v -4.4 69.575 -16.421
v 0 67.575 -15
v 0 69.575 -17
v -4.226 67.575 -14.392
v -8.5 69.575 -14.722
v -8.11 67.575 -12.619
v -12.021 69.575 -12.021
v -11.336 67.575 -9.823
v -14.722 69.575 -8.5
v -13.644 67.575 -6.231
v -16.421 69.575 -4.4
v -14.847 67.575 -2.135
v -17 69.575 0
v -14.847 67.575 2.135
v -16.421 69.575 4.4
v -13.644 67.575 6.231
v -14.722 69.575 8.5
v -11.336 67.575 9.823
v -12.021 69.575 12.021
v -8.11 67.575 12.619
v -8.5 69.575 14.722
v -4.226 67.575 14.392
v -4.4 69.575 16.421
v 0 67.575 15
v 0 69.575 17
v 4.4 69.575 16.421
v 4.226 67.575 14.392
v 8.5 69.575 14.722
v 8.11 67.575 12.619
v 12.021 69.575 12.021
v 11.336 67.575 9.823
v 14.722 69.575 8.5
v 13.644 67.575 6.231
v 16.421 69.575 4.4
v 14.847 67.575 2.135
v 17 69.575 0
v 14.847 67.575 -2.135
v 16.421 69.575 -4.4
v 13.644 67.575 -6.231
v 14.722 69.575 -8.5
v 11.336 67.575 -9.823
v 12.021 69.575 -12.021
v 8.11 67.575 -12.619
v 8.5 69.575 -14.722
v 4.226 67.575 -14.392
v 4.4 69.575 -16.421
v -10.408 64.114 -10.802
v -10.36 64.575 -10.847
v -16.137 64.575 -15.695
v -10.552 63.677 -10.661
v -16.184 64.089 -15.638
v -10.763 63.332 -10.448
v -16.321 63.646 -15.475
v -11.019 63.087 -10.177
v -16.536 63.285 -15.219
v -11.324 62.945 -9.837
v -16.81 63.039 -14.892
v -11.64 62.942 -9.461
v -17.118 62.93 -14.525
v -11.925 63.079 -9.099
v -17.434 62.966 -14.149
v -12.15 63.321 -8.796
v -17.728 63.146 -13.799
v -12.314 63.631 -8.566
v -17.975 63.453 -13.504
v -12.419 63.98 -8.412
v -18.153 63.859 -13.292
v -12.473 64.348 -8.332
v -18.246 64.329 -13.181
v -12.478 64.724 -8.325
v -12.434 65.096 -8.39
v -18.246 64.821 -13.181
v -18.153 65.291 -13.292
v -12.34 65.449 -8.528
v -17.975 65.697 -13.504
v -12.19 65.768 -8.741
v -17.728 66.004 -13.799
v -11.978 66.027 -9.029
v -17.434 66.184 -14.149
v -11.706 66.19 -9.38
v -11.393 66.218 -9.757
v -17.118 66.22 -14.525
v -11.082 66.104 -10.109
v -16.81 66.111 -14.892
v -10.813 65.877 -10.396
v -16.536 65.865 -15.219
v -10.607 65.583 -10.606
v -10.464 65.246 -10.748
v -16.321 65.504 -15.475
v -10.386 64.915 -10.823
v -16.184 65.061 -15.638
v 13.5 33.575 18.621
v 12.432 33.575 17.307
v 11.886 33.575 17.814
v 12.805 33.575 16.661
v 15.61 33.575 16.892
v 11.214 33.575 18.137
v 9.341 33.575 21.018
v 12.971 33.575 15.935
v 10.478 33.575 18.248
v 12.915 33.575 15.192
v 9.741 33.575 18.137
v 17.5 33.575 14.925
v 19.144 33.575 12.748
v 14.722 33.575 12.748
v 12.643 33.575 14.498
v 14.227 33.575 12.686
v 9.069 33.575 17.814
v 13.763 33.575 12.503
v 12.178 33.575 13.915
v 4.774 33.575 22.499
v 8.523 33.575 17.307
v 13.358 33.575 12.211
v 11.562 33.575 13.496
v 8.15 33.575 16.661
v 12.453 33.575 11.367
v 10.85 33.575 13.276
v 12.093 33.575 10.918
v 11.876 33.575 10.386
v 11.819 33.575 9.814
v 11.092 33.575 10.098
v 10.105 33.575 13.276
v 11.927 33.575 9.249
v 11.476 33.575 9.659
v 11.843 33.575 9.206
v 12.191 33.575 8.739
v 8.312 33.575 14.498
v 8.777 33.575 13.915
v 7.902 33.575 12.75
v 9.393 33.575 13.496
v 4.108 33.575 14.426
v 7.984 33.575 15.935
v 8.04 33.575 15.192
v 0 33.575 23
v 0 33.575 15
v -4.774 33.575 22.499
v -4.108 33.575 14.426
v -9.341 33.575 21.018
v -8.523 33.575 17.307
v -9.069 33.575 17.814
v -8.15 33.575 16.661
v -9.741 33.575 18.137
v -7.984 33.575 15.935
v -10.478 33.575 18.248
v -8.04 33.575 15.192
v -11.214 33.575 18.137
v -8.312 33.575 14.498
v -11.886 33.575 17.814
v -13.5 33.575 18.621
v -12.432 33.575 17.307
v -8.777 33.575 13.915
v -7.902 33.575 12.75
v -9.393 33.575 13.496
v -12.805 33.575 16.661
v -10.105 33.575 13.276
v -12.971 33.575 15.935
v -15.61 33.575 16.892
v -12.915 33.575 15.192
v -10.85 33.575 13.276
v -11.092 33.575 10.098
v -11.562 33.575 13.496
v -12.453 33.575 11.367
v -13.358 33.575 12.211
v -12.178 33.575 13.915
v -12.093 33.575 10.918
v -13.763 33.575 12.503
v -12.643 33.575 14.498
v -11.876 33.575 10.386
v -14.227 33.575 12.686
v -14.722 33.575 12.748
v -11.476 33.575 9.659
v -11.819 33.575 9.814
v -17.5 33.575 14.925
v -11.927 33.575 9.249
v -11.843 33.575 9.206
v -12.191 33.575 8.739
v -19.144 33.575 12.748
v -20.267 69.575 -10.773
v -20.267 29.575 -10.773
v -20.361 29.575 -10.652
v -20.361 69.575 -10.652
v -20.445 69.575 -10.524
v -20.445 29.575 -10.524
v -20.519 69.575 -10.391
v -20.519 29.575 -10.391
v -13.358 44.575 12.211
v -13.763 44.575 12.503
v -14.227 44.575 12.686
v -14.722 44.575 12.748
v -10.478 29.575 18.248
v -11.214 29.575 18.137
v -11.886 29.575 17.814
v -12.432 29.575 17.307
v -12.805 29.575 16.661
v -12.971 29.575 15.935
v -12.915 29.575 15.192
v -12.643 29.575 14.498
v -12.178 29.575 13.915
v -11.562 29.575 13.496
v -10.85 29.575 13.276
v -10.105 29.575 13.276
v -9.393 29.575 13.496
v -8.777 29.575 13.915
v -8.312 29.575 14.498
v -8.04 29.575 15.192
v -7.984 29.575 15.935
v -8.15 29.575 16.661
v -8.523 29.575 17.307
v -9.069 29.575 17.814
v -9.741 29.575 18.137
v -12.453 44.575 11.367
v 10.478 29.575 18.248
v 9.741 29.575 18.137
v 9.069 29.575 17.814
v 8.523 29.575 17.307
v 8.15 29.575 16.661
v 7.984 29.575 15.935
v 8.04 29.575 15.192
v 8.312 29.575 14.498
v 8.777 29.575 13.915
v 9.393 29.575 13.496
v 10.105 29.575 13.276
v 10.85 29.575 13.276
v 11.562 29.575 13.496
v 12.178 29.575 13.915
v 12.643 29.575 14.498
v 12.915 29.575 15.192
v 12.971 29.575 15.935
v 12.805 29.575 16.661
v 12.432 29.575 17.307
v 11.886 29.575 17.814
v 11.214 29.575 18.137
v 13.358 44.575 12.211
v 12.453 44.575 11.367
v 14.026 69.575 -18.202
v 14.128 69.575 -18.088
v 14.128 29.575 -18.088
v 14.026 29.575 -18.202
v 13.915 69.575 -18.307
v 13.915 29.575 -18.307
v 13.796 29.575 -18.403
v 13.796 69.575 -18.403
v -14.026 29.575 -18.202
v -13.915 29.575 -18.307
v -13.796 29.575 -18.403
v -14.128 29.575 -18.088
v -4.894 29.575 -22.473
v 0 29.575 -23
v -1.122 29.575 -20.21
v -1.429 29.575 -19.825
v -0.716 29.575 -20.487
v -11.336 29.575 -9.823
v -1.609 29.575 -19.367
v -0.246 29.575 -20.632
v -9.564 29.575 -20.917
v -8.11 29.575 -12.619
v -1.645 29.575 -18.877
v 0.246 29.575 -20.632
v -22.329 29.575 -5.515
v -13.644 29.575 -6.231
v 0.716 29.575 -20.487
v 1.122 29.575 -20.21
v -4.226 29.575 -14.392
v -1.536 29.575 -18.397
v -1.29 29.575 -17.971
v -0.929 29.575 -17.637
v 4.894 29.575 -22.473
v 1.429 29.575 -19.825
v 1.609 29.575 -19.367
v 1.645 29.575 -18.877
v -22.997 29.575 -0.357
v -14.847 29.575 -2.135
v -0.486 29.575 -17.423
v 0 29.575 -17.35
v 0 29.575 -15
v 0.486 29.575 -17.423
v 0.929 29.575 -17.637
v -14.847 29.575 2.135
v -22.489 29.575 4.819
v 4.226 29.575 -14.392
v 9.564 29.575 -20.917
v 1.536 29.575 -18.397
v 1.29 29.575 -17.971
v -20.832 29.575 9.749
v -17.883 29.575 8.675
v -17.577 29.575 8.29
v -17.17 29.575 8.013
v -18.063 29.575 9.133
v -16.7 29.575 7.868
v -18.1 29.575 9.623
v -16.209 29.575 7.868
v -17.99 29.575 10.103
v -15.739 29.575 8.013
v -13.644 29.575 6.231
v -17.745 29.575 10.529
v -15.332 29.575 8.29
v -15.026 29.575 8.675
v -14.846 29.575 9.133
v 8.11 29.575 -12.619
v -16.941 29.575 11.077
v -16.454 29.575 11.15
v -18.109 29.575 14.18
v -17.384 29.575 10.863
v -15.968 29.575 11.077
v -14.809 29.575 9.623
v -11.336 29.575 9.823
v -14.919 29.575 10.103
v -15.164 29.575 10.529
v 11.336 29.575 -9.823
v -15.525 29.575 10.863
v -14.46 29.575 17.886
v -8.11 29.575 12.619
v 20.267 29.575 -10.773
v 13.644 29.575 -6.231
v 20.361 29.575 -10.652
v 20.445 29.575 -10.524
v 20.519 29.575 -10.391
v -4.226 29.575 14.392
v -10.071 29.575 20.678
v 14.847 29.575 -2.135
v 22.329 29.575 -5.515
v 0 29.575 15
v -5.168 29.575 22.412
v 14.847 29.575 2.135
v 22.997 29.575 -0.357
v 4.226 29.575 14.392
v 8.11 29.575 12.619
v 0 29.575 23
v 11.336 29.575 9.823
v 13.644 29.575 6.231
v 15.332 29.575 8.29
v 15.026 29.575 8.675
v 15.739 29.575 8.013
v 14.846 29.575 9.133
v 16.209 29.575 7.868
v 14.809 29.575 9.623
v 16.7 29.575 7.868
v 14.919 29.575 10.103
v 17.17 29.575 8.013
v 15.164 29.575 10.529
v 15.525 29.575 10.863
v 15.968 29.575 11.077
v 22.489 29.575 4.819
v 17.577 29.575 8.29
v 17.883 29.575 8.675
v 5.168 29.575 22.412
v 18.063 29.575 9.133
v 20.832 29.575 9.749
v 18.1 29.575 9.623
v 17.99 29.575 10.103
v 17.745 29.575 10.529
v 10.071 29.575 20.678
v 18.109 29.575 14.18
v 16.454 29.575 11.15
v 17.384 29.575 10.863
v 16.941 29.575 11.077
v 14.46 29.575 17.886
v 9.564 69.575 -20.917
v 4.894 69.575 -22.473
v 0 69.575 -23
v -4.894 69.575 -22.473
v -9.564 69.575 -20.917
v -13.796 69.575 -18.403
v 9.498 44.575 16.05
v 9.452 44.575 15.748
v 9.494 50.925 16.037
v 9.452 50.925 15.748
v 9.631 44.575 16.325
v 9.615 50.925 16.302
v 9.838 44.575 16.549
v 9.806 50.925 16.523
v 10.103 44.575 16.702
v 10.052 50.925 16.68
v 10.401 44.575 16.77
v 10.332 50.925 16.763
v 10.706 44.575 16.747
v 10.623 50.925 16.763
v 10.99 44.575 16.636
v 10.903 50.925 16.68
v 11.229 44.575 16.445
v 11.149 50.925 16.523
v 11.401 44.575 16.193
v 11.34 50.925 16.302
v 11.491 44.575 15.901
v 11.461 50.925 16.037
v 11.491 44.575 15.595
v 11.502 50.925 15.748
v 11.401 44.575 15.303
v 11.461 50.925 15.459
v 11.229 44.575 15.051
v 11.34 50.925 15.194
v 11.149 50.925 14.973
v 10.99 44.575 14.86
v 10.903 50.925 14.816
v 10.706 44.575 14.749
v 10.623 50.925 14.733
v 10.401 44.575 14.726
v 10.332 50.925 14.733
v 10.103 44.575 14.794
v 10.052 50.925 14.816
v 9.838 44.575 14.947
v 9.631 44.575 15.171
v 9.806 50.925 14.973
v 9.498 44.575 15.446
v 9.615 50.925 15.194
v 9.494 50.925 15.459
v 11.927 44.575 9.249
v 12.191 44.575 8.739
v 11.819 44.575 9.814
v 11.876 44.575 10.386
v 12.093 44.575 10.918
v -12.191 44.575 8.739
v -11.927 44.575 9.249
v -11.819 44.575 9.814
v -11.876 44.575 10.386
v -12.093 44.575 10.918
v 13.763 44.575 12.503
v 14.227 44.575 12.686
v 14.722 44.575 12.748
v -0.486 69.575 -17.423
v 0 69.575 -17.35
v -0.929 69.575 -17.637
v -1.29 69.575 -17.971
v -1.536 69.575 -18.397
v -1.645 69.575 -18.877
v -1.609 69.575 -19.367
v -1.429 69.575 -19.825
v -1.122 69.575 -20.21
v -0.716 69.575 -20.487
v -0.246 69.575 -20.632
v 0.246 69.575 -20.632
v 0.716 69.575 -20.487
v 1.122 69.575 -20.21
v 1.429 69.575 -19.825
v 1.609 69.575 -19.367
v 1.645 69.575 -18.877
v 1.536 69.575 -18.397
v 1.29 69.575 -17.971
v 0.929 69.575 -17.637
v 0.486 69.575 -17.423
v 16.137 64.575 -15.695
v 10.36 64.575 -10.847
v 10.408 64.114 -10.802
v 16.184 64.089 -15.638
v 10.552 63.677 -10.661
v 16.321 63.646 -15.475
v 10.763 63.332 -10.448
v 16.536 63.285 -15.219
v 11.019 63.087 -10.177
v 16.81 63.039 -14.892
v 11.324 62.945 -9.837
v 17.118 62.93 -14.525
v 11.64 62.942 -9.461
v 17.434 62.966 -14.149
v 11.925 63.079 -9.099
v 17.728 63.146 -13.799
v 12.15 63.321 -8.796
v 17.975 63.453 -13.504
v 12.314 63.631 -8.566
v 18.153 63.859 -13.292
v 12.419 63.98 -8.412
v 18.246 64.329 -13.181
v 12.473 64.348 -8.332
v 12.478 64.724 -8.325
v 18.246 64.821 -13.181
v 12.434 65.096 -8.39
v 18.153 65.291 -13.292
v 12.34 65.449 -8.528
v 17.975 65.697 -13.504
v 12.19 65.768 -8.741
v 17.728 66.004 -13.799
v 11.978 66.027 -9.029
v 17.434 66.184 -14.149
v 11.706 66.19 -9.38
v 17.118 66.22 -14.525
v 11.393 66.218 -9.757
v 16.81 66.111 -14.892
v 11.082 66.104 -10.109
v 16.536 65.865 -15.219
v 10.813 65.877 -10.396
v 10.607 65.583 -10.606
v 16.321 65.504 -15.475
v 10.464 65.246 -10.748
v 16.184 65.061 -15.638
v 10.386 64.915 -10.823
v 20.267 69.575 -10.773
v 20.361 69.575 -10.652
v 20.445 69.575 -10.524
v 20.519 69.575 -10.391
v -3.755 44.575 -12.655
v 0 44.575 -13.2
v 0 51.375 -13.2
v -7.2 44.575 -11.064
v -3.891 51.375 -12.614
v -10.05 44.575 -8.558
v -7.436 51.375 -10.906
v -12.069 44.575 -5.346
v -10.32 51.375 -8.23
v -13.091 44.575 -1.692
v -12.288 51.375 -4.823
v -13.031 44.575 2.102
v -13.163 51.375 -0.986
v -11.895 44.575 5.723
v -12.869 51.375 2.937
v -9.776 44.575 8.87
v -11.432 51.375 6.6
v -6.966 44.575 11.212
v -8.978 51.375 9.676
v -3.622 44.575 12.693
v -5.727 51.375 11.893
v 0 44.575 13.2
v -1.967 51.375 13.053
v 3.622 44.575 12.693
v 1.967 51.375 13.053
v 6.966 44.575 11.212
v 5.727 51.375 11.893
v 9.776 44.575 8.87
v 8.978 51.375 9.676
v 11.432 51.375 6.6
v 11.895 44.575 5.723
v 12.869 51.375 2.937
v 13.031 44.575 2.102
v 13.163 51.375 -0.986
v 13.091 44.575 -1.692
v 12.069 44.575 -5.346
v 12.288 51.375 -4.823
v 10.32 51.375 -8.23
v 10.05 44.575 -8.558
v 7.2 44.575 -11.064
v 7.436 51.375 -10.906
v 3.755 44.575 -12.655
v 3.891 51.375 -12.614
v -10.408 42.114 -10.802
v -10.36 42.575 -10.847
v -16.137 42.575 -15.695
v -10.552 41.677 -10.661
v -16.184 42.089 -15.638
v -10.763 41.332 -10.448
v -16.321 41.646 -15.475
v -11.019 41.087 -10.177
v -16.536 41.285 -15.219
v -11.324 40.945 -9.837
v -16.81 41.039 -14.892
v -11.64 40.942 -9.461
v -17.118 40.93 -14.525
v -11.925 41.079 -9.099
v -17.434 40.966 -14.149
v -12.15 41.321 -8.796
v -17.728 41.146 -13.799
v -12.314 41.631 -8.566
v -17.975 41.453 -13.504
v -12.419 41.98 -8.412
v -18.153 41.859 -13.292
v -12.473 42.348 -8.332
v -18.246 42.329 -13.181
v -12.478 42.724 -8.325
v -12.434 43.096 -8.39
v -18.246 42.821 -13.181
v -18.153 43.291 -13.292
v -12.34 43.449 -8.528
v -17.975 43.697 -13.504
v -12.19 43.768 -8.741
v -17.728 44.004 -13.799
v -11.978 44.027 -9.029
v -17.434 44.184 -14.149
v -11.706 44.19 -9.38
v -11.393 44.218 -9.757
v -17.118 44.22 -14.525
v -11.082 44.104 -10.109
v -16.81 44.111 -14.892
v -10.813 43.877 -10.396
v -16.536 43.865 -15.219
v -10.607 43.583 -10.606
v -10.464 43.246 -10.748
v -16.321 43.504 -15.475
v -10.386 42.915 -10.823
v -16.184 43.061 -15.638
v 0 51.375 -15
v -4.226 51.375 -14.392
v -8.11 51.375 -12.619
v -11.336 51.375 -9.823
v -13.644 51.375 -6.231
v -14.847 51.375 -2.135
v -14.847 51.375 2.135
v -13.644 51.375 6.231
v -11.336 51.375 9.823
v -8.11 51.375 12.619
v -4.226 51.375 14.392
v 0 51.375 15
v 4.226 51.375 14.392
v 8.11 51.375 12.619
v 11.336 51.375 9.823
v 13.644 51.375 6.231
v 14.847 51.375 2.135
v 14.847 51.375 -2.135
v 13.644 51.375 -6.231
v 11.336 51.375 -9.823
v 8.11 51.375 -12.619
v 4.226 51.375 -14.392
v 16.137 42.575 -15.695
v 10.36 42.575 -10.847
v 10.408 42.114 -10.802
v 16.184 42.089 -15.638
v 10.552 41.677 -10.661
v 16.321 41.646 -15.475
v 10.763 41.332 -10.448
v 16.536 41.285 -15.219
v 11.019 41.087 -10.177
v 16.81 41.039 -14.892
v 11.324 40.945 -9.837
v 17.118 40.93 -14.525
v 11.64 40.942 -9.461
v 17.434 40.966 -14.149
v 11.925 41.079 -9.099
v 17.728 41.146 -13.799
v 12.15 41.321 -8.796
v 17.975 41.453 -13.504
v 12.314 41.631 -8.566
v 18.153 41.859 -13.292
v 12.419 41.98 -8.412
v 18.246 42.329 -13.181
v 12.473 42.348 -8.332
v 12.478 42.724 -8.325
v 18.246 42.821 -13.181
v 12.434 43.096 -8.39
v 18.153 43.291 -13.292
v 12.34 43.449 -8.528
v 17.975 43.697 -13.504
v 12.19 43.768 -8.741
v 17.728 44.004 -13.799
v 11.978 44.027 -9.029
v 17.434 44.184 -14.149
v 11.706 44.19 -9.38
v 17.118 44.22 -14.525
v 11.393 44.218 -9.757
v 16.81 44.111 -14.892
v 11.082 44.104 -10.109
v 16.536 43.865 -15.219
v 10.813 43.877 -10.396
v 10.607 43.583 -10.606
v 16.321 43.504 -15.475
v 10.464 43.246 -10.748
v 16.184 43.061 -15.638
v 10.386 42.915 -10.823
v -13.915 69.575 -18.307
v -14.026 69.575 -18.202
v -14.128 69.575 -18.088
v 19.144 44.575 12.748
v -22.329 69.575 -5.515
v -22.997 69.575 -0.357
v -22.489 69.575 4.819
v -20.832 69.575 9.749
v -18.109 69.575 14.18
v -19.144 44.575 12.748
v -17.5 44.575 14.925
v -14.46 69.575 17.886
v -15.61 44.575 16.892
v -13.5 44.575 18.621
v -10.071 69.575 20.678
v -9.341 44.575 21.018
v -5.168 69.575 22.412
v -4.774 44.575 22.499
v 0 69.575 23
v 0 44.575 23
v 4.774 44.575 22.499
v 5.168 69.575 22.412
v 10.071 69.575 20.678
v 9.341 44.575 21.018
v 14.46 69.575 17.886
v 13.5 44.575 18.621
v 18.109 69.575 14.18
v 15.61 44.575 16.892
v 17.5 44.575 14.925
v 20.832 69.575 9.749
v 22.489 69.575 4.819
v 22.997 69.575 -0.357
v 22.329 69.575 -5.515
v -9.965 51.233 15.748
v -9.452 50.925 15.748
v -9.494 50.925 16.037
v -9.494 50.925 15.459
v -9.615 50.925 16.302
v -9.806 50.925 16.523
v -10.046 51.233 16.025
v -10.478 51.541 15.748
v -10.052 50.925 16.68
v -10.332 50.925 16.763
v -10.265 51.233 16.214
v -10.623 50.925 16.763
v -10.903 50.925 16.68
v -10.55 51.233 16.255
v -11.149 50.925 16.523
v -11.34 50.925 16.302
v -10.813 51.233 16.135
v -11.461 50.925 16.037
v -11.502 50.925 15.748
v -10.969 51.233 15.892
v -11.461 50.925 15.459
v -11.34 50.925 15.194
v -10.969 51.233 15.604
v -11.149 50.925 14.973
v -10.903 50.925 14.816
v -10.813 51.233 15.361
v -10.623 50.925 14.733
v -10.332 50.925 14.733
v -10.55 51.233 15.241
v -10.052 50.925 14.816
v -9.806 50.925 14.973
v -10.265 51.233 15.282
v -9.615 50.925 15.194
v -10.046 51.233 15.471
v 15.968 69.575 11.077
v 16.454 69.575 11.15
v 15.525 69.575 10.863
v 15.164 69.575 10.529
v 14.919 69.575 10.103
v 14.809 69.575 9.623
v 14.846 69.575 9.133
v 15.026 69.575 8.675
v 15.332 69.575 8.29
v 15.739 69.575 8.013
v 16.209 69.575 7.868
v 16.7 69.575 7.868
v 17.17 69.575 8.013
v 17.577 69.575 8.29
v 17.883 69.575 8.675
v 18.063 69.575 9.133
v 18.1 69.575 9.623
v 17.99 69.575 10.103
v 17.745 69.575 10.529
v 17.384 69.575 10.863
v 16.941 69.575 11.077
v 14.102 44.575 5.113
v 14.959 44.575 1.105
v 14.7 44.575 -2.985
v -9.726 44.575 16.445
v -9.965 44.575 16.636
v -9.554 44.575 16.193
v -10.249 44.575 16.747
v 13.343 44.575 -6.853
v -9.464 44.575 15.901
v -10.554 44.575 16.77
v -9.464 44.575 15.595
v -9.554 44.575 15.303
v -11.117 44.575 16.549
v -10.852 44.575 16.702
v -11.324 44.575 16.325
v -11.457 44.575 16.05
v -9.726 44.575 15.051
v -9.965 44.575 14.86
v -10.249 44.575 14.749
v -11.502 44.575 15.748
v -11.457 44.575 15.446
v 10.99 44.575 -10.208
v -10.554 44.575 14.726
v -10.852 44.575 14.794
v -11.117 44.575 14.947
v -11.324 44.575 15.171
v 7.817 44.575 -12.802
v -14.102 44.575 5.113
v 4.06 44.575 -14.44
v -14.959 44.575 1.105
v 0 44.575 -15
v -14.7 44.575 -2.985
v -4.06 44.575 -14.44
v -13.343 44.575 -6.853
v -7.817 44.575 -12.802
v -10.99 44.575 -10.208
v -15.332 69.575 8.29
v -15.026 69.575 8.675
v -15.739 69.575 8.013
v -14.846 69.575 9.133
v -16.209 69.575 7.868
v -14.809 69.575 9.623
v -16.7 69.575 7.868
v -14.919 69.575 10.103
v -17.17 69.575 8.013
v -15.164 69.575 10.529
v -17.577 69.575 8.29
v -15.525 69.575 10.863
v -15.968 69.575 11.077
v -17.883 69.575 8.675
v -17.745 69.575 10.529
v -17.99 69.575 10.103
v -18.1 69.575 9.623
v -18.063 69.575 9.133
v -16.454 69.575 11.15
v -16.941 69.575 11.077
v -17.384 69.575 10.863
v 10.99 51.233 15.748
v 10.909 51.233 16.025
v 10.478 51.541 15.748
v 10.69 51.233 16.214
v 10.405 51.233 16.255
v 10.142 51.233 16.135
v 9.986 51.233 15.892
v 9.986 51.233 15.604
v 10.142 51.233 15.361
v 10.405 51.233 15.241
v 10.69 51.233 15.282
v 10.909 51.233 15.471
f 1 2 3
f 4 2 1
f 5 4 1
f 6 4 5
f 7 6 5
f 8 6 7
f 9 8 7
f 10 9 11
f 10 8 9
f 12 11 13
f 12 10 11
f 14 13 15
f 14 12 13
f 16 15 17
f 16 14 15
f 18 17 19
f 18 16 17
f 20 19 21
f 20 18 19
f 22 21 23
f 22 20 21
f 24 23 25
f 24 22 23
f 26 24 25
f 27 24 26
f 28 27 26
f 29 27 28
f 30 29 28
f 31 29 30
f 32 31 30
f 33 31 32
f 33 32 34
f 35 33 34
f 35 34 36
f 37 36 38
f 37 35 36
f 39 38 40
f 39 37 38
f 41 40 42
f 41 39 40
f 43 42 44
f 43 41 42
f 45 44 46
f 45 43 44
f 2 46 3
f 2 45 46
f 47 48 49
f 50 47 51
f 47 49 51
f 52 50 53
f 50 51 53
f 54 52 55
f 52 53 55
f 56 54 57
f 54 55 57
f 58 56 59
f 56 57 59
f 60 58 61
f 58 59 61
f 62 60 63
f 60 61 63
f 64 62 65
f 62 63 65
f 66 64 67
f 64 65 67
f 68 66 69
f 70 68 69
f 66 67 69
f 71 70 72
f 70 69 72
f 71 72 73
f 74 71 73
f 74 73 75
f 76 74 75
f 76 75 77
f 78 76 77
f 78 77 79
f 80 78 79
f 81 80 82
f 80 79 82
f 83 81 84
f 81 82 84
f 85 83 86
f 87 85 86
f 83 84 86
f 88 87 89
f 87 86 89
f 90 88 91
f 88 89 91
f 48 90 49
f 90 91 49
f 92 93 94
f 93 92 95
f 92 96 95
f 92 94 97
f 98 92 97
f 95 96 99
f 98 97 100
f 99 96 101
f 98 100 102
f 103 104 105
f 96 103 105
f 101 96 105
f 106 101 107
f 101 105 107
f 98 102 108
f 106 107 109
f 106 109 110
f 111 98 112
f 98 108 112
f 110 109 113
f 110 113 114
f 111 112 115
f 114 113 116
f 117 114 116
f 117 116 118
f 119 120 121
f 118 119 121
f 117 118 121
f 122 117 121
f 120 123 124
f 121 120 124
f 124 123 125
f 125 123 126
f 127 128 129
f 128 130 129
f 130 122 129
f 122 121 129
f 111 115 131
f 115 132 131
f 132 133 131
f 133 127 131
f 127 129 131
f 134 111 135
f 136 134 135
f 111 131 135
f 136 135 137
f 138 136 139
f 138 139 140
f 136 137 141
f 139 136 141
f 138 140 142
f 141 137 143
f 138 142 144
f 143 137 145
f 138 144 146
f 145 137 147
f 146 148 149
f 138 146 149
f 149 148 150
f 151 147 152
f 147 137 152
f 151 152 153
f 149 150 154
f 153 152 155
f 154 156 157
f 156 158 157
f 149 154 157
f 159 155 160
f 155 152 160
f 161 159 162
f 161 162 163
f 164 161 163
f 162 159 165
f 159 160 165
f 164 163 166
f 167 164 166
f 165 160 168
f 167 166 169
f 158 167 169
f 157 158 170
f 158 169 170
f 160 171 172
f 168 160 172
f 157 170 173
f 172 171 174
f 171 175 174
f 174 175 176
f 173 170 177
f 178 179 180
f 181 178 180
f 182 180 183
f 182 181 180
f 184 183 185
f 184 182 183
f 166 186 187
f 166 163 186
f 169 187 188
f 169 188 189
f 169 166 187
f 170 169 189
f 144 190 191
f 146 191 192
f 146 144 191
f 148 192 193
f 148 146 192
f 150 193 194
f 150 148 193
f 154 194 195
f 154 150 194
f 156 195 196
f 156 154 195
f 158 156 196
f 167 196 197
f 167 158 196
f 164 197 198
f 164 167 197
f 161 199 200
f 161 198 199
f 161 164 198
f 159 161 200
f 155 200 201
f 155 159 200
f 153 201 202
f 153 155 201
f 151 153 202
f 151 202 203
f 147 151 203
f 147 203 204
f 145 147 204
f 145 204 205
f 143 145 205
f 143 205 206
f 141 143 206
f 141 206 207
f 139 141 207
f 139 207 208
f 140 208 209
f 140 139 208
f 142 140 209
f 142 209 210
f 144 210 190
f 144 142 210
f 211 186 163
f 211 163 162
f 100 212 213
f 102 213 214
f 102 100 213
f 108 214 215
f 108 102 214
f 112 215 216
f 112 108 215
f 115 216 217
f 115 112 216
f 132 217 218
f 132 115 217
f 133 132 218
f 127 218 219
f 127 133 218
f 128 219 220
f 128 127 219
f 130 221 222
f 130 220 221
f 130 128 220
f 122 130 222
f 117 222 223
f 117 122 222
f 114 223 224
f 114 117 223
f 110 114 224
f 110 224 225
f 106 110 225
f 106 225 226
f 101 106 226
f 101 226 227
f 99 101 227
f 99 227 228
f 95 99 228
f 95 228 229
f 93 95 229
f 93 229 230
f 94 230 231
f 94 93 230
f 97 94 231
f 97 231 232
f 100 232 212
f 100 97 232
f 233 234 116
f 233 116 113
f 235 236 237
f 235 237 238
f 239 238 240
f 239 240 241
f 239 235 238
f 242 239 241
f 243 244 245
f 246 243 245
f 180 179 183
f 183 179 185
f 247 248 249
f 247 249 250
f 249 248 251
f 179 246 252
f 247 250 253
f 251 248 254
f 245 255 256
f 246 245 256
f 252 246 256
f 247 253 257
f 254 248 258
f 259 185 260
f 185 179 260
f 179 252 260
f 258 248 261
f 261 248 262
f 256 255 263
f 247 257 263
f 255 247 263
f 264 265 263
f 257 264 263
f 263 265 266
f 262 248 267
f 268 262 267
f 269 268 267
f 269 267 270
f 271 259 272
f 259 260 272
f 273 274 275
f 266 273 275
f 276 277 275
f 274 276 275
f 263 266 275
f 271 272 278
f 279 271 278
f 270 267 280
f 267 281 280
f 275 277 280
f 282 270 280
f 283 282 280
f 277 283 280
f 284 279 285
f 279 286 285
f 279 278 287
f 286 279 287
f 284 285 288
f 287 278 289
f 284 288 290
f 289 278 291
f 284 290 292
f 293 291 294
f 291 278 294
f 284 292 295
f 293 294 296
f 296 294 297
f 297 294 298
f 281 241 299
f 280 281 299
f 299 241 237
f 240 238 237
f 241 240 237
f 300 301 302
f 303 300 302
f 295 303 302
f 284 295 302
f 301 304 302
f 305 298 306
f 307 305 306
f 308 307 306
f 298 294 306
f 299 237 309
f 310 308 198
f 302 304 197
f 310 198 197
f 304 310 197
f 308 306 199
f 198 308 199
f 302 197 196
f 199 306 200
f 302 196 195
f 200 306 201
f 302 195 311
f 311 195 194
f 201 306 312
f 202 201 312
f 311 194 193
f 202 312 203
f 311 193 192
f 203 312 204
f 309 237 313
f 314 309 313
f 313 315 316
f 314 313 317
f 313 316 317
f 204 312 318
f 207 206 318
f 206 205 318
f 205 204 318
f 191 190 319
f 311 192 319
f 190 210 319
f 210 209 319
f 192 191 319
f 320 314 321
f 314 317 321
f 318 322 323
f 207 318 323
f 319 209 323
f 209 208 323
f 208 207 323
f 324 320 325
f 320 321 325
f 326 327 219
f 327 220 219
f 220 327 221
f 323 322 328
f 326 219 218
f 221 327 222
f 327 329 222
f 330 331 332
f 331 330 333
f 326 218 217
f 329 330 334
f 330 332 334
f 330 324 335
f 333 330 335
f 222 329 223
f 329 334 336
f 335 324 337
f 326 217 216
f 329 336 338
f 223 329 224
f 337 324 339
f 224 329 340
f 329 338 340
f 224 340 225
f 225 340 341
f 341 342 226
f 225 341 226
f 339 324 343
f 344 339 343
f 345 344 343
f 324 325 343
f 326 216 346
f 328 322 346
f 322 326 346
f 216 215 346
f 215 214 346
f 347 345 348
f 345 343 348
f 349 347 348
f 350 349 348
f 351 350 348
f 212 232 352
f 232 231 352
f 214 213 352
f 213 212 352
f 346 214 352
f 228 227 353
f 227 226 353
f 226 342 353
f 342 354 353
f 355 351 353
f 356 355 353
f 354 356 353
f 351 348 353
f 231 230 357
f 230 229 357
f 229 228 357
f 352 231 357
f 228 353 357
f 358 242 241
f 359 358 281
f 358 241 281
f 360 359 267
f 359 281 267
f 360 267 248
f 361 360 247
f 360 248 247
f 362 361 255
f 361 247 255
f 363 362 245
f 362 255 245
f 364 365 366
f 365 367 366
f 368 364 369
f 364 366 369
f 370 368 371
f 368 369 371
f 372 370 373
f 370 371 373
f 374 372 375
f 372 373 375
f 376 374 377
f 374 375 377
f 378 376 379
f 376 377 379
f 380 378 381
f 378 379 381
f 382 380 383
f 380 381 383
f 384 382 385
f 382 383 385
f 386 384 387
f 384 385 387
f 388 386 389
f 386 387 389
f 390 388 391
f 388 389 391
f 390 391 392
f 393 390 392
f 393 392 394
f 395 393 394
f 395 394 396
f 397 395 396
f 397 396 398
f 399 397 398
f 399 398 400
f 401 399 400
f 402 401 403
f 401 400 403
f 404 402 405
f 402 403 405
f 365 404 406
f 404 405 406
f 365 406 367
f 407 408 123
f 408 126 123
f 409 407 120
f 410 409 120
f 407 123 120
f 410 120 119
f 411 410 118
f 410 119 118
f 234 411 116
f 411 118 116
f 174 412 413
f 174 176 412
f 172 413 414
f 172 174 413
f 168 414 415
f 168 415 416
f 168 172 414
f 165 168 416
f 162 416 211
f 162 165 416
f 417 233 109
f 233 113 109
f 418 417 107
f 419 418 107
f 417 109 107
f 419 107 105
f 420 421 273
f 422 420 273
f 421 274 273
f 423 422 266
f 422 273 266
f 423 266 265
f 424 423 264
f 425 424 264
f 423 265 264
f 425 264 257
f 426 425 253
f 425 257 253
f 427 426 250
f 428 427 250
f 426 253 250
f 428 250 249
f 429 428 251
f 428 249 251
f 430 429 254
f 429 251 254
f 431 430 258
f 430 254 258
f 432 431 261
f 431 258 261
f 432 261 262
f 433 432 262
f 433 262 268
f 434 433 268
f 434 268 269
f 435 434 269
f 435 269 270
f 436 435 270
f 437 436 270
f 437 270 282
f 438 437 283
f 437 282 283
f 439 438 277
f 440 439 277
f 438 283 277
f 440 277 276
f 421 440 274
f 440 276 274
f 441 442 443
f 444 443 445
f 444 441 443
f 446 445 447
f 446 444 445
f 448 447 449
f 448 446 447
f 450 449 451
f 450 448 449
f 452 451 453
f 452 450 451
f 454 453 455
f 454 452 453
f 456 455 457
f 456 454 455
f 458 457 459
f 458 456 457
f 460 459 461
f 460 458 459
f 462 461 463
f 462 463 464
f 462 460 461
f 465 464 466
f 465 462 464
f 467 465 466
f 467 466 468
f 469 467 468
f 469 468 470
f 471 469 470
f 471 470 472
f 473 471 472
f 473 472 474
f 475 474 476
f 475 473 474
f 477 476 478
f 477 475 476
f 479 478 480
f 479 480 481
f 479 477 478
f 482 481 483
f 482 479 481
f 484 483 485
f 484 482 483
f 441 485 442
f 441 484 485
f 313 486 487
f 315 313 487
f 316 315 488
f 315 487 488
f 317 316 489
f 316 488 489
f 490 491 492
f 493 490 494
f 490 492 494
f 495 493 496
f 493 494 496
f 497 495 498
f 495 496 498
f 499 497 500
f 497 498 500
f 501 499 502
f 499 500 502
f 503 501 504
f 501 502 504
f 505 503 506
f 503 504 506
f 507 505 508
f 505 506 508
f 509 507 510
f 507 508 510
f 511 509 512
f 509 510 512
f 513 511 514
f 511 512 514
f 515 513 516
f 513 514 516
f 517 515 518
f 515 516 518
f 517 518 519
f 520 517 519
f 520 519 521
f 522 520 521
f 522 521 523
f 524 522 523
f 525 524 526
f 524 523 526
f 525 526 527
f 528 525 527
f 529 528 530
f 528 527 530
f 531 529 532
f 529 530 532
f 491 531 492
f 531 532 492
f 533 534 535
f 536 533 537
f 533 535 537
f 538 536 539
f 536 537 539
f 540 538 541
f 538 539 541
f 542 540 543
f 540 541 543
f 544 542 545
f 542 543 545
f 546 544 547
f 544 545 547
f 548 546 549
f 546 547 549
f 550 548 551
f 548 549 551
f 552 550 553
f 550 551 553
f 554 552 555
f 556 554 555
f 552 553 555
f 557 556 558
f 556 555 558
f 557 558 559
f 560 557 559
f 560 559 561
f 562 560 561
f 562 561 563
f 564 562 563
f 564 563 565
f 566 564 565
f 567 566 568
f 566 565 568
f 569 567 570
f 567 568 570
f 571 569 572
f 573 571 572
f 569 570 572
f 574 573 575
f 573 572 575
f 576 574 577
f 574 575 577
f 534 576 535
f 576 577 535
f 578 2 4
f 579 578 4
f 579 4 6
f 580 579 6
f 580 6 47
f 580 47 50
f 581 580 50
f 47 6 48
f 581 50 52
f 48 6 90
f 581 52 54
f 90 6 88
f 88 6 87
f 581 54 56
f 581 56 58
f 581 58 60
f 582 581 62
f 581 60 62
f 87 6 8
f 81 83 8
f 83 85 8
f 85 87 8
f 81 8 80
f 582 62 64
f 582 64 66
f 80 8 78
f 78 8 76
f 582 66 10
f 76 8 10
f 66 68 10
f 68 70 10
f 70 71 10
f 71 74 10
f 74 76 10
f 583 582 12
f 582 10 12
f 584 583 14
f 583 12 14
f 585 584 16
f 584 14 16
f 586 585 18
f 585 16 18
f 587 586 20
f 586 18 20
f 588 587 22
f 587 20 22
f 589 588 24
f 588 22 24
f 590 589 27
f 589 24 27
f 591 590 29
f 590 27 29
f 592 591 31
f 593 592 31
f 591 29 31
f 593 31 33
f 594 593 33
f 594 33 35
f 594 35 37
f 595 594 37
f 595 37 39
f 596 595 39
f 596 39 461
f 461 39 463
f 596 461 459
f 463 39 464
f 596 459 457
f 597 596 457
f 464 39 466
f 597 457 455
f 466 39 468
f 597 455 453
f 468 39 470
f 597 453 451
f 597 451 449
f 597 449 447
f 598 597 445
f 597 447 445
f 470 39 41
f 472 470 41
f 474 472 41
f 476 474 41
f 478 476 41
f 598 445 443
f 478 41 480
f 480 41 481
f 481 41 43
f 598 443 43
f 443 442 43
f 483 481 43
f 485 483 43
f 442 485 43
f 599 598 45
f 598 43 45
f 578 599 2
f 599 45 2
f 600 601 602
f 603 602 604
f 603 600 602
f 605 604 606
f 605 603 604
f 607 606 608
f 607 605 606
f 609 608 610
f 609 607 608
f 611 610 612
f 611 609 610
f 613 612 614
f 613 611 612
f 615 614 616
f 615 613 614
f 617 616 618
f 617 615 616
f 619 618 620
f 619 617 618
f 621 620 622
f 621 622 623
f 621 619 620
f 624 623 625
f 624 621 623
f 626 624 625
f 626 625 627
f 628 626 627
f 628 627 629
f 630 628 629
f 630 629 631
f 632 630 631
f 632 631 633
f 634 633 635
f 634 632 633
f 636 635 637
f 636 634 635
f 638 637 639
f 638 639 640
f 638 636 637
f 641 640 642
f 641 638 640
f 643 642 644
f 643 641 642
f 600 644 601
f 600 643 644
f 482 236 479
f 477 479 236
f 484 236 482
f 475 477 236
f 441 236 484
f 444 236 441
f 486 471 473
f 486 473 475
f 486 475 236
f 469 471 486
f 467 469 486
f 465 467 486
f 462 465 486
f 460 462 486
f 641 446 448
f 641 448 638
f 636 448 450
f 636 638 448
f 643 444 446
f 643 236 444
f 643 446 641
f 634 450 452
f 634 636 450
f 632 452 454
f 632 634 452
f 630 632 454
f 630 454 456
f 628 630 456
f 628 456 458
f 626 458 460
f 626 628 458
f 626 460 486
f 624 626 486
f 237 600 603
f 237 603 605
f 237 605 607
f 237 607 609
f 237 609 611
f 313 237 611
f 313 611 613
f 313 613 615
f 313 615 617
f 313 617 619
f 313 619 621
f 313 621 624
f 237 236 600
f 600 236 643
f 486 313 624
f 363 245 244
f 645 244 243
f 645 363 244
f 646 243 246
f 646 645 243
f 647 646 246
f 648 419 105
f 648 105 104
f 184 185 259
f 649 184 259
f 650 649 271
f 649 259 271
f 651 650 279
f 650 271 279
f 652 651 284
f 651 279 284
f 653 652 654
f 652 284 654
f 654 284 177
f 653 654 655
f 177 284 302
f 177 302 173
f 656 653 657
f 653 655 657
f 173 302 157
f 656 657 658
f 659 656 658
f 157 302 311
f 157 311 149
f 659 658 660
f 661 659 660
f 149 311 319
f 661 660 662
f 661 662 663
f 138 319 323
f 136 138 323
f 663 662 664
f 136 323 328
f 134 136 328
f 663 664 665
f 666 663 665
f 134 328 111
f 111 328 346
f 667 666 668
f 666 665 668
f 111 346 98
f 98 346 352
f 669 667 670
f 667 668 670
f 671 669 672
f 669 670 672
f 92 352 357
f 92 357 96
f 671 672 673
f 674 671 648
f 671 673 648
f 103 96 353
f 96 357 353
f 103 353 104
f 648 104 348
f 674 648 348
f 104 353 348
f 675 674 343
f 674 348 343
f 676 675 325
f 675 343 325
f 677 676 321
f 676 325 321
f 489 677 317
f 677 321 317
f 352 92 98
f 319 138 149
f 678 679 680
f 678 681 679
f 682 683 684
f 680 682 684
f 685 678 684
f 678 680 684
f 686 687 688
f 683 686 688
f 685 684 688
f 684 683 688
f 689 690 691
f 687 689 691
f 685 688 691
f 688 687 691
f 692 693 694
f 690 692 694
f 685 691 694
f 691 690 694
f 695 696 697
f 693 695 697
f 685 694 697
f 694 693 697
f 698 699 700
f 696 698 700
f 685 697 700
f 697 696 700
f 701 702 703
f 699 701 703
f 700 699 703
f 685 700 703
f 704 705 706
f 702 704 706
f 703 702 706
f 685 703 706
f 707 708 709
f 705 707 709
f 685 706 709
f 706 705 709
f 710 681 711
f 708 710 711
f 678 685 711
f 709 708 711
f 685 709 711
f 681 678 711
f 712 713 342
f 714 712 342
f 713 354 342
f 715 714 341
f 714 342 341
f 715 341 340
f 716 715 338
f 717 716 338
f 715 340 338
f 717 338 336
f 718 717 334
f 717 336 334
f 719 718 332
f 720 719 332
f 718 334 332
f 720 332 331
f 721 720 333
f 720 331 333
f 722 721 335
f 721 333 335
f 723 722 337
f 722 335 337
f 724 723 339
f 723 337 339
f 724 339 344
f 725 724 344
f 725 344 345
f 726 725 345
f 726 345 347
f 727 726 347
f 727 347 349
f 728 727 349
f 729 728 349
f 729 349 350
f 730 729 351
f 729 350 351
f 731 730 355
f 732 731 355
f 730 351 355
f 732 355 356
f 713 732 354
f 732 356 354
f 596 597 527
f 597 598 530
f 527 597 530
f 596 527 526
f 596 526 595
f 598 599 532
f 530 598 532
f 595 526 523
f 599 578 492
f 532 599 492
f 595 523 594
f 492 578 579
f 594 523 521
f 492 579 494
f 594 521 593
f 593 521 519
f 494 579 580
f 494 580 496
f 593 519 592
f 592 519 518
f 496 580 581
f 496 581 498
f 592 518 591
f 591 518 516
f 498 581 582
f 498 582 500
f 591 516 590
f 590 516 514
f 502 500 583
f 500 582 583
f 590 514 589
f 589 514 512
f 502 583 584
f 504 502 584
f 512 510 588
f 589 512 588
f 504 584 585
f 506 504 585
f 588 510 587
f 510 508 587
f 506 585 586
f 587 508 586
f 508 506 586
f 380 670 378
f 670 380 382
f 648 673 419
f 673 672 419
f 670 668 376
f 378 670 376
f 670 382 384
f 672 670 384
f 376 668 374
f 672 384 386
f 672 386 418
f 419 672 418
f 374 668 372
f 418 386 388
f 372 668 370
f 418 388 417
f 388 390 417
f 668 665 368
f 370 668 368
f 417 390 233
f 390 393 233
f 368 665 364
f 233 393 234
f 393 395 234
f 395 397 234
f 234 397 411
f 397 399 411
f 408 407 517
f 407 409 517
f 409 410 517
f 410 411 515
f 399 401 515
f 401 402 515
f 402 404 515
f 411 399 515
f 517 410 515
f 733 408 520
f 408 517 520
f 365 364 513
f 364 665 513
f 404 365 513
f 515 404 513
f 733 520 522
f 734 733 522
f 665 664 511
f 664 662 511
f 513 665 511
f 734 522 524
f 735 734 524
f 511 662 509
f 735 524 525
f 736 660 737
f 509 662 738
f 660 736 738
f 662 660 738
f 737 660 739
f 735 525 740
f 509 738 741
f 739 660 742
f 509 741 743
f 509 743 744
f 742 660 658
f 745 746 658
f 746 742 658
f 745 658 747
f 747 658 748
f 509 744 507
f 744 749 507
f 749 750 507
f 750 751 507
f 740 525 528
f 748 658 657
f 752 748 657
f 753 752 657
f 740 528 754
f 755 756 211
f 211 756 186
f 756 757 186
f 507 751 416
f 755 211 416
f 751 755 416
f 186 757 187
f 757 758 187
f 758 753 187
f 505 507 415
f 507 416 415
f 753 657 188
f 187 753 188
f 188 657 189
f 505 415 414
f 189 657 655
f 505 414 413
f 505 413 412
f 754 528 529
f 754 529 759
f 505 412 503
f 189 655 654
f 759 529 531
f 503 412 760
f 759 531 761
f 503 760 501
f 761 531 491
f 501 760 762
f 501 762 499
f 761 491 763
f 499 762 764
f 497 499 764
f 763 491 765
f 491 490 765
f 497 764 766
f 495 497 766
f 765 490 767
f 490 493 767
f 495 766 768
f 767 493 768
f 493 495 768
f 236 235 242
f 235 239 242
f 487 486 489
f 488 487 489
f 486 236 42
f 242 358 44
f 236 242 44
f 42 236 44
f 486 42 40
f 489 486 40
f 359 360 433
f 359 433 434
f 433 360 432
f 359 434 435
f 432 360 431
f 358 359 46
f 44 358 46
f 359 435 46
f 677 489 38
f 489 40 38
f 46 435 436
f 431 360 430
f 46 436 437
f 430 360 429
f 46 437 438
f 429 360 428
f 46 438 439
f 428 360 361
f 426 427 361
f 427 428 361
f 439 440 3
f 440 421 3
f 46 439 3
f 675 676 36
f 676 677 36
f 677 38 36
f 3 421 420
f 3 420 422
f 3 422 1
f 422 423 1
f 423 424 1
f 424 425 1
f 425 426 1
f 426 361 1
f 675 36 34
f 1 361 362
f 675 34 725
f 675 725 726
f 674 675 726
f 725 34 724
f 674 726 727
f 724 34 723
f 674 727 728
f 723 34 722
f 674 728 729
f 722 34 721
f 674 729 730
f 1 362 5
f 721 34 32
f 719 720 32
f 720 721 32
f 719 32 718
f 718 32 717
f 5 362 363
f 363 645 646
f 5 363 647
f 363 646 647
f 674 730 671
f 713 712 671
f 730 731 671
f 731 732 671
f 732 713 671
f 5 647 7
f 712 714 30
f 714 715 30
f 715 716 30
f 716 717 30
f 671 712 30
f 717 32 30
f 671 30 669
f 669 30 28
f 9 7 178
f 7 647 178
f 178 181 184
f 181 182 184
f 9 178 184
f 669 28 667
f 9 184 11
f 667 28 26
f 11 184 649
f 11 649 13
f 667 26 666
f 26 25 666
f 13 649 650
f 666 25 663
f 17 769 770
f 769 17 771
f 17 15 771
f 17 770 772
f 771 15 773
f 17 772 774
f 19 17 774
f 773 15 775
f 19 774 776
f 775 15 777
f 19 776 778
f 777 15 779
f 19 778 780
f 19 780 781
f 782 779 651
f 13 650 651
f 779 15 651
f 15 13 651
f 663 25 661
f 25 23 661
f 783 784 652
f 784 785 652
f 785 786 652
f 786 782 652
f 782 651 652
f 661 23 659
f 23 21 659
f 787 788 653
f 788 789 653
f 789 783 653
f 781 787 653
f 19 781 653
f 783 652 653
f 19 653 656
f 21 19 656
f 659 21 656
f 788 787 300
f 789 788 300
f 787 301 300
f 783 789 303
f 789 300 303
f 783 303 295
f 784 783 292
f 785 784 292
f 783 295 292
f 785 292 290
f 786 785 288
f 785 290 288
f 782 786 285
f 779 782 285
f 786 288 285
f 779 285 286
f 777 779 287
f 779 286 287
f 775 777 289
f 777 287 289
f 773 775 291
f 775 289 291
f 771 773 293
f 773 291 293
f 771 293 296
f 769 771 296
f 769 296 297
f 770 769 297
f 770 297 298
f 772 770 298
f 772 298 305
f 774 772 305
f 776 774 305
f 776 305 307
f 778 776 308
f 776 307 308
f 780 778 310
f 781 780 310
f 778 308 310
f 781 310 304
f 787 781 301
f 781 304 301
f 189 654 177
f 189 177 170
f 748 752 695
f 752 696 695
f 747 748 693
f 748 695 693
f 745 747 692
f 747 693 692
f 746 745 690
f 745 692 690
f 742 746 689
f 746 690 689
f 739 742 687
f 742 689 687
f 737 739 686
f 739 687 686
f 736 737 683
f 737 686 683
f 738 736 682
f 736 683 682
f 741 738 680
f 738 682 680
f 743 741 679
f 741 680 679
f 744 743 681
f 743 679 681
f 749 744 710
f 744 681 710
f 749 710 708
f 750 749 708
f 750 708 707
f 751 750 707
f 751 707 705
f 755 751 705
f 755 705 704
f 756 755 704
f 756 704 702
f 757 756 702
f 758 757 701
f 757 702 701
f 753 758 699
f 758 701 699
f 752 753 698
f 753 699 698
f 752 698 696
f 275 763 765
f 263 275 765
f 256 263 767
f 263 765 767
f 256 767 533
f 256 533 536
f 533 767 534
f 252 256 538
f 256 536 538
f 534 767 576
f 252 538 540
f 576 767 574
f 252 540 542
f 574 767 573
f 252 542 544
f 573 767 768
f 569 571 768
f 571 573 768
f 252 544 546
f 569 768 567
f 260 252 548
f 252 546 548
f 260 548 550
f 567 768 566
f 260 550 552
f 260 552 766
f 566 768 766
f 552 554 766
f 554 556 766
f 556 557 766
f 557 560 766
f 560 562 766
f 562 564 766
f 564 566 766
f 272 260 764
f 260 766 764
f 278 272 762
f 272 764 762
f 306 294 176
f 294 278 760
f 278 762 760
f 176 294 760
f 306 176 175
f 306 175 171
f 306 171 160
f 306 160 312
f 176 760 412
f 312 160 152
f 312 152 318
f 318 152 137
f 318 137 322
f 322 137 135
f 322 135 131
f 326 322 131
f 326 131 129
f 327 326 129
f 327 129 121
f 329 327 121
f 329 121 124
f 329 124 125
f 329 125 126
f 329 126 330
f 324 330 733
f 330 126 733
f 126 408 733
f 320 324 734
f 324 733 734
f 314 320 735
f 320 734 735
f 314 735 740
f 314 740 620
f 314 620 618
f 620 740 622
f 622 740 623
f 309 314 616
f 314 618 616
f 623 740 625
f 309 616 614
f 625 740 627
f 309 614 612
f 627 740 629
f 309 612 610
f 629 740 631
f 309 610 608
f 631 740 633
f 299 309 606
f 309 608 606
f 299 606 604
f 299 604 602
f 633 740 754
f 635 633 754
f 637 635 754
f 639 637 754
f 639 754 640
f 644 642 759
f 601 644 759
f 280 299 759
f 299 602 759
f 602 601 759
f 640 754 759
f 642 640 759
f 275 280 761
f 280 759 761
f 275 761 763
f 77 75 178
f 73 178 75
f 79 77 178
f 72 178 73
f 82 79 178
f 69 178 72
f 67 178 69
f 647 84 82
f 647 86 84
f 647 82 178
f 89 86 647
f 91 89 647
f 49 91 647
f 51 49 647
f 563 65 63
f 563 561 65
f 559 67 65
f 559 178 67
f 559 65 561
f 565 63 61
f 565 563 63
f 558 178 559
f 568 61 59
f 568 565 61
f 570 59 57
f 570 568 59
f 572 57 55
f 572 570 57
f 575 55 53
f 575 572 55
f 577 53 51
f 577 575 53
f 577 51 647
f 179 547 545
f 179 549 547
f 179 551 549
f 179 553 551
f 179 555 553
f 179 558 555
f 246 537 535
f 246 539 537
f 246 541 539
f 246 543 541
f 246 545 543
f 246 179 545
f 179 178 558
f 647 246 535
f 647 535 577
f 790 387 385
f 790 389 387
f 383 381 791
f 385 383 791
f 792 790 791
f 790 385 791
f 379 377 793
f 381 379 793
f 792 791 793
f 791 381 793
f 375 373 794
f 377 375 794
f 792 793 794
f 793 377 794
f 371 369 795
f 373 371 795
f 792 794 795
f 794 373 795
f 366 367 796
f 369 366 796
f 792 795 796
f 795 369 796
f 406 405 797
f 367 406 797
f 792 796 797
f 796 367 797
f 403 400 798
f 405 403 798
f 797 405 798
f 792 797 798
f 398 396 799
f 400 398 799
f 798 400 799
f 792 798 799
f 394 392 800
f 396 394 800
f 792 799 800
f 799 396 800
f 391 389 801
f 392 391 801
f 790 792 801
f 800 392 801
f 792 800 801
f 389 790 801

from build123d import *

# Parameters (mm, degrees)
CUT_EXTRUDE1_DEPTH         = 11
FILLET1_R                  = 2
M2_5_TAPPED_HOLE1_D        = 2.05
M2_5_TAPPED_HOLE1_DEPTH    = 6.35
M2_5_TAPPED_HOLE1_TIP      = 0.615882135
SKETCH11_OUTSIDE_W         = 67.05
SKETCH11_OUTSIDE_H         = 67.05
CUT_EXTRUDE2_DEPTH         = 77.802868599
FILLET3_R                  = 2
CHAMFER1_SIZE              = 2
M4_TAPPED_HOLE1_AT_2_COUNT = 2
M4_TAPPED_HOLE1_AT_2_PITCH = 22
SKETCH15_R                 = 1.5
CUT_EXTRUDE4_DEPTH         = 10
SKETCH8_W                  = 1.65
SKETCH8_H                  = 40
M4_TAPPED_HOLE2_AT_2_COUNT = 2
M4_TAPPED_HOLE2_AT_2_PITCH = 32.908965344
M4_TAPPED_HOLE2_AT_3_COUNT = 2
M4_TAPPED_HOLE2_AT_3_PITCH = 32.908965344
CUT_EXTRUDE6_START         = 11
SKETCH17_R                 = 2.5
CUT_EXTRUDE6_DEPTH         = 4.001
SKETCH14_R                 = 2.15
CUT_EXTRUDE3_DEPTH         = 29.575


with BuildPart() as part:
    # Sketch1 → Revolve1 (revolve)
    with BuildSketch(Plane(origin=(0, 0, 0), x_dir=(0, 0, -1), z_dir=(1, 0, 0))):
        Polygon((13.2, 44.575), (13.2, 51.375), (15, 51.375), (15, 69.575), (23, 69.575), (23, 0), (13.2, 0), (9.5, 0), (9.5, 4), (15, 4), (15, 44.575), align=None)
    revolve(axis=Axis((0, 0, 0), (0, 1, 0)))

    # Sketch5 → Cut-Extrude1 (cut)
    with BuildSketch(Plane(origin=(0, 44.575, 0), x_dir=(-1, 0, 0), z_dir=(0, -1, 0))):
        with BuildLine():
            Line((-13.5, -18.62122445), (-13.5, -25.735977403))
            Line((-13.5, -25.735977403), (13.5, -25.735977403))
            Line((13.5, -25.735977403), (13.5, -18.62122445))
            ThreePointArc((13.5, -18.62122445), (16.584015432, -15.936449797), (19.14388926, -12.748))
            Line((19.14388926, -12.748), (13.93421226, -12.748))
            Line((13.93421226, -12.748), (11.092149393, -10.0977335))
            ThreePointArc((11.092149393, -10.0977335), (0, -15), (-11.092149393, -10.0977335))
            Line((-11.092149393, -10.0977335), (-13.93421226, -12.748))
            Line((-13.93421226, -12.748), (-19.14388926, -12.748))
            ThreePointArc((-19.14388926, -12.748), (-16.584015432, -15.936449797), (-13.5, -18.62122445))
        make_face()
        with BuildLine():
            Line((-7.5, -6.748), (-9.775605232, -8.870036209))
            ThreePointArc((-9.775605232, -8.870036209), (0, -13.2), (9.775605232, -8.870036209))
            Line((9.775605232, -8.870036209), (7.5, -6.748))
            Line((7.5, -6.748), (-7.5, -6.748))
        make_face()
    extrude(amount=CUT_EXTRUDE1_DEPTH, mode=Mode.SUBTRACT)

    # Fillet1
    fillet1_edges = [part.edges().sort_by_distance(p)[0] for p in [
        (11.092149393, 39.075, 10.0977335),
        (-11.092149393, 39.075, 10.0977335),
        (-13.93421226, 39.075, 12.748),
        (13.93421226, 39.075, 12.748),
    ]]
    fillet(fillet1_edges, radius=FILLET1_R)

    # M2.5 Tapped Hole1
    with Locations(Plane.XZ.offset(-44.575)):
        with Locations((-10.4775, 15.748), (10.4775, 15.748)):
            Hole(M2_5_TAPPED_HOLE1_D / 2, depth=M2_5_TAPPED_HOLE1_DEPTH)
            with Locations((0, 0, -(M2_5_TAPPED_HOLE1_DEPTH + M2_5_TAPPED_HOLE1_TIP / 2))):  # 118° drill point
                Cone(0, M2_5_TAPPED_HOLE1_D / 2, M2_5_TAPPED_HOLE1_TIP, mode=Mode.SUBTRACT)

    # Sketch11 outside → Cut-Extrude2 (cut, through all)
    with BuildSketch(Plane(origin=(0, 0, 0), x_dir=(1, 0, 0), z_dir=(0, 1, 0))):
        Rectangle(SKETCH11_OUTSIDE_W, SKETCH11_OUTSIDE_H)
        with BuildLine():
            Line((13.983717047, 18.260768263), (20.411593144, 10.600323832))
            ThreePointArc((20.411593144, 10.600323832), (0, -23), (-20.411593144, 10.600323832))
            Line((-20.411593144, 10.600323832), (-13.983717047, 18.260768263))
            ThreePointArc((-13.983717047, 18.260768263), (0, 23), (13.983717047, 18.260768263))
        make_face(mode=Mode.SUBTRACT)
    extrude(amount=CUT_EXTRUDE2_DEPTH, mode=Mode.SUBTRACT)

    # Fillet3
    fillet3_edges = [part.edges().sort_by_distance(p)[0] for p in [
        (13.983717047, 34.7875, -18.260768263),
        (-13.983717047, 34.7875, -18.260768263),
        (-20.411593144, 34.7875, -10.600323832),
        (20.411593144, 34.7875, -10.600323832),
    ]]
    fillet(fillet3_edges, radius=FILLET3_R)

    # Chamfer1
    chamfer1_edges = [part.edges().sort_by_distance(p)[0] for p in [
        (0, 69.575, 15),
    ]]
    chamfer(chamfer1_edges, length=CHAMFER1_SIZE)

    # Sketch12 → M4 Tapped Hole1 (revolve, cut)
    with BuildSketch(Plane(origin=(17.197655095, 42.575, -14.430546047), x_dir=(-0.6427876096865435, 0, -0.7660444431189747), z_dir=(0, 1, 0))):
        Polygon((0, 0), (0, 11.091420021), (1.65, 10.1), (1.65, 0), align=None)
    m4_tapped_hole1 = revolve(axis=Axis((22.062037309, 42.575, -18.512247369), (-0.7660444431189746, 0, 0.6427876096865436)), mode=Mode.SUBTRACT)

    # M4 Tapped Hole1 at 2: M4 Tapped Hole1 ×2
    with Locations(*[(0, i * M4_TAPPED_HOLE1_AT_2_PITCH, 0) for i in range(1, M4_TAPPED_HOLE1_AT_2_COUNT)]):
        add(m4_tapped_hole1, mode=Mode.SUBTRACT)

    # Mirror1: M4 Tapped Hole1 across plane
    add(m4_tapped_hole1.mirror(Plane(origin=(0, 0, 0), x_dir=(0, 0, 1), z_dir=(1, 0, 0))), mode=Mode.SUBTRACT)

    # Mirror1 copy 1 sketch → Mirror1 copy 1 (revolve, cut)
    with BuildSketch(Plane(origin=(-17.197655095, 64.575, -14.430546047), x_dir=(0.6427876096865435, 0, -0.7660444431189747), z_dir=(0, 1, 0))):
        Polygon((0, 0), (0, -11.091420021), (1.65, -10.1), (1.65, 0), align=None)
    revolve(axis=Axis((-22.062037309, 64.575, -18.512247369), (-0.7660444431189746, 0, -0.6427876096865436)), mode=Mode.SUBTRACT)

    # Sketch15 → Cut-Extrude4 (cut)
    with BuildSketch(Plane.XZ):
        with Locations(Location((-9.192388155, -9.192388155, 0), (0, 0, 270))):
            Circle(SKETCH15_R)
        with Locations(Location((-9.192388155, 9.192388155, 0), (0, 0, 270))):
            Circle(SKETCH15_R)
        with Locations(Location((9.192388155, 9.192388155, 0), (0, 0, 270))):
            Circle(SKETCH15_R)
        with Locations(Location((9.192388155, -9.192388155, 0), (0, 0, 270))):
            Circle(SKETCH15_R)
    extrude(amount=-CUT_EXTRUDE4_DEPTH, mode=Mode.SUBTRACT)


with BuildPart() as body_2:
    # Split1: the piece on the far side of the plane
    add(part.part)
    split(bisect_by=Plane.ZX.offset(29.575), keep=Keep.BOTTOM)

    # Sketch14 → Cut-Extrude3 (cut)
    with BuildSketch(Plane.XZ):
        with Locations(Location((-16.454482672, 9.5, 0), (0, 0, 270))):
            Circle(SKETCH14_R)
        with Locations(Location((16.454482672, 9.5, 0), (0, 0, 270))):
            Circle(SKETCH14_R)
        with Locations(Location((0, -19, 0), (0, 0, 270))):
            Circle(SKETCH14_R)
    extrude(amount=-CUT_EXTRUDE3_DEPTH, mode=Mode.SUBTRACT)


with BuildPart() as part_1:
    add(part.part)

    # Split1
    split(bisect_by=Plane.ZX.offset(29.575), keep=Keep.TOP)

    # Sketch8 → M4 Tapped Hole2 (revolve, cut)
    with BuildSketch(Plane(origin=(-16.454482672, 69.575, 9.5), x_dir=(0, 0, 1), z_dir=(1, 0, 0))):
        with Locations((0.825, 20)):
            Rectangle(SKETCH8_W, SKETCH8_H)
    m4_tapped_hole2 = revolve(axis=Axis((-16.454482672, 75.925, 9.5), (0, -1, 0)), mode=Mode.SUBTRACT)

    # M4 Tapped Hole2 at 2: M4 Tapped Hole2 ×2
    with Locations(*[Vector(0.499999999999998, 0, -0.8660254037844398) * (i * M4_TAPPED_HOLE2_AT_2_PITCH) for i in range(1, M4_TAPPED_HOLE2_AT_2_COUNT)]):
        add(m4_tapped_hole2, mode=Mode.SUBTRACT)

    # M4 Tapped Hole2 at 3: M4 Tapped Hole2 ×2
    with Locations(*[(i * M4_TAPPED_HOLE2_AT_3_PITCH, 0, 0) for i in range(1, M4_TAPPED_HOLE2_AT_3_COUNT)]):
        add(m4_tapped_hole2, mode=Mode.SUBTRACT)

    # Sketch17 → Cut-Extrude6 (cut)
    with BuildSketch(Plane.XZ.offset(-44.575).offset(CUT_EXTRUDE6_START)):
        with Locations(Location((10.4775, 15.748, 0), (0, 0, 90))):
            Circle(SKETCH17_R)
        with Locations(Location((-10.4775, 15.748, 0), (0, 0, 90))):
            Circle(SKETCH17_R)
    extrude(amount=CUT_EXTRUDE6_DEPTH, mode=Mode.SUBTRACT)


solid = part_1.part
